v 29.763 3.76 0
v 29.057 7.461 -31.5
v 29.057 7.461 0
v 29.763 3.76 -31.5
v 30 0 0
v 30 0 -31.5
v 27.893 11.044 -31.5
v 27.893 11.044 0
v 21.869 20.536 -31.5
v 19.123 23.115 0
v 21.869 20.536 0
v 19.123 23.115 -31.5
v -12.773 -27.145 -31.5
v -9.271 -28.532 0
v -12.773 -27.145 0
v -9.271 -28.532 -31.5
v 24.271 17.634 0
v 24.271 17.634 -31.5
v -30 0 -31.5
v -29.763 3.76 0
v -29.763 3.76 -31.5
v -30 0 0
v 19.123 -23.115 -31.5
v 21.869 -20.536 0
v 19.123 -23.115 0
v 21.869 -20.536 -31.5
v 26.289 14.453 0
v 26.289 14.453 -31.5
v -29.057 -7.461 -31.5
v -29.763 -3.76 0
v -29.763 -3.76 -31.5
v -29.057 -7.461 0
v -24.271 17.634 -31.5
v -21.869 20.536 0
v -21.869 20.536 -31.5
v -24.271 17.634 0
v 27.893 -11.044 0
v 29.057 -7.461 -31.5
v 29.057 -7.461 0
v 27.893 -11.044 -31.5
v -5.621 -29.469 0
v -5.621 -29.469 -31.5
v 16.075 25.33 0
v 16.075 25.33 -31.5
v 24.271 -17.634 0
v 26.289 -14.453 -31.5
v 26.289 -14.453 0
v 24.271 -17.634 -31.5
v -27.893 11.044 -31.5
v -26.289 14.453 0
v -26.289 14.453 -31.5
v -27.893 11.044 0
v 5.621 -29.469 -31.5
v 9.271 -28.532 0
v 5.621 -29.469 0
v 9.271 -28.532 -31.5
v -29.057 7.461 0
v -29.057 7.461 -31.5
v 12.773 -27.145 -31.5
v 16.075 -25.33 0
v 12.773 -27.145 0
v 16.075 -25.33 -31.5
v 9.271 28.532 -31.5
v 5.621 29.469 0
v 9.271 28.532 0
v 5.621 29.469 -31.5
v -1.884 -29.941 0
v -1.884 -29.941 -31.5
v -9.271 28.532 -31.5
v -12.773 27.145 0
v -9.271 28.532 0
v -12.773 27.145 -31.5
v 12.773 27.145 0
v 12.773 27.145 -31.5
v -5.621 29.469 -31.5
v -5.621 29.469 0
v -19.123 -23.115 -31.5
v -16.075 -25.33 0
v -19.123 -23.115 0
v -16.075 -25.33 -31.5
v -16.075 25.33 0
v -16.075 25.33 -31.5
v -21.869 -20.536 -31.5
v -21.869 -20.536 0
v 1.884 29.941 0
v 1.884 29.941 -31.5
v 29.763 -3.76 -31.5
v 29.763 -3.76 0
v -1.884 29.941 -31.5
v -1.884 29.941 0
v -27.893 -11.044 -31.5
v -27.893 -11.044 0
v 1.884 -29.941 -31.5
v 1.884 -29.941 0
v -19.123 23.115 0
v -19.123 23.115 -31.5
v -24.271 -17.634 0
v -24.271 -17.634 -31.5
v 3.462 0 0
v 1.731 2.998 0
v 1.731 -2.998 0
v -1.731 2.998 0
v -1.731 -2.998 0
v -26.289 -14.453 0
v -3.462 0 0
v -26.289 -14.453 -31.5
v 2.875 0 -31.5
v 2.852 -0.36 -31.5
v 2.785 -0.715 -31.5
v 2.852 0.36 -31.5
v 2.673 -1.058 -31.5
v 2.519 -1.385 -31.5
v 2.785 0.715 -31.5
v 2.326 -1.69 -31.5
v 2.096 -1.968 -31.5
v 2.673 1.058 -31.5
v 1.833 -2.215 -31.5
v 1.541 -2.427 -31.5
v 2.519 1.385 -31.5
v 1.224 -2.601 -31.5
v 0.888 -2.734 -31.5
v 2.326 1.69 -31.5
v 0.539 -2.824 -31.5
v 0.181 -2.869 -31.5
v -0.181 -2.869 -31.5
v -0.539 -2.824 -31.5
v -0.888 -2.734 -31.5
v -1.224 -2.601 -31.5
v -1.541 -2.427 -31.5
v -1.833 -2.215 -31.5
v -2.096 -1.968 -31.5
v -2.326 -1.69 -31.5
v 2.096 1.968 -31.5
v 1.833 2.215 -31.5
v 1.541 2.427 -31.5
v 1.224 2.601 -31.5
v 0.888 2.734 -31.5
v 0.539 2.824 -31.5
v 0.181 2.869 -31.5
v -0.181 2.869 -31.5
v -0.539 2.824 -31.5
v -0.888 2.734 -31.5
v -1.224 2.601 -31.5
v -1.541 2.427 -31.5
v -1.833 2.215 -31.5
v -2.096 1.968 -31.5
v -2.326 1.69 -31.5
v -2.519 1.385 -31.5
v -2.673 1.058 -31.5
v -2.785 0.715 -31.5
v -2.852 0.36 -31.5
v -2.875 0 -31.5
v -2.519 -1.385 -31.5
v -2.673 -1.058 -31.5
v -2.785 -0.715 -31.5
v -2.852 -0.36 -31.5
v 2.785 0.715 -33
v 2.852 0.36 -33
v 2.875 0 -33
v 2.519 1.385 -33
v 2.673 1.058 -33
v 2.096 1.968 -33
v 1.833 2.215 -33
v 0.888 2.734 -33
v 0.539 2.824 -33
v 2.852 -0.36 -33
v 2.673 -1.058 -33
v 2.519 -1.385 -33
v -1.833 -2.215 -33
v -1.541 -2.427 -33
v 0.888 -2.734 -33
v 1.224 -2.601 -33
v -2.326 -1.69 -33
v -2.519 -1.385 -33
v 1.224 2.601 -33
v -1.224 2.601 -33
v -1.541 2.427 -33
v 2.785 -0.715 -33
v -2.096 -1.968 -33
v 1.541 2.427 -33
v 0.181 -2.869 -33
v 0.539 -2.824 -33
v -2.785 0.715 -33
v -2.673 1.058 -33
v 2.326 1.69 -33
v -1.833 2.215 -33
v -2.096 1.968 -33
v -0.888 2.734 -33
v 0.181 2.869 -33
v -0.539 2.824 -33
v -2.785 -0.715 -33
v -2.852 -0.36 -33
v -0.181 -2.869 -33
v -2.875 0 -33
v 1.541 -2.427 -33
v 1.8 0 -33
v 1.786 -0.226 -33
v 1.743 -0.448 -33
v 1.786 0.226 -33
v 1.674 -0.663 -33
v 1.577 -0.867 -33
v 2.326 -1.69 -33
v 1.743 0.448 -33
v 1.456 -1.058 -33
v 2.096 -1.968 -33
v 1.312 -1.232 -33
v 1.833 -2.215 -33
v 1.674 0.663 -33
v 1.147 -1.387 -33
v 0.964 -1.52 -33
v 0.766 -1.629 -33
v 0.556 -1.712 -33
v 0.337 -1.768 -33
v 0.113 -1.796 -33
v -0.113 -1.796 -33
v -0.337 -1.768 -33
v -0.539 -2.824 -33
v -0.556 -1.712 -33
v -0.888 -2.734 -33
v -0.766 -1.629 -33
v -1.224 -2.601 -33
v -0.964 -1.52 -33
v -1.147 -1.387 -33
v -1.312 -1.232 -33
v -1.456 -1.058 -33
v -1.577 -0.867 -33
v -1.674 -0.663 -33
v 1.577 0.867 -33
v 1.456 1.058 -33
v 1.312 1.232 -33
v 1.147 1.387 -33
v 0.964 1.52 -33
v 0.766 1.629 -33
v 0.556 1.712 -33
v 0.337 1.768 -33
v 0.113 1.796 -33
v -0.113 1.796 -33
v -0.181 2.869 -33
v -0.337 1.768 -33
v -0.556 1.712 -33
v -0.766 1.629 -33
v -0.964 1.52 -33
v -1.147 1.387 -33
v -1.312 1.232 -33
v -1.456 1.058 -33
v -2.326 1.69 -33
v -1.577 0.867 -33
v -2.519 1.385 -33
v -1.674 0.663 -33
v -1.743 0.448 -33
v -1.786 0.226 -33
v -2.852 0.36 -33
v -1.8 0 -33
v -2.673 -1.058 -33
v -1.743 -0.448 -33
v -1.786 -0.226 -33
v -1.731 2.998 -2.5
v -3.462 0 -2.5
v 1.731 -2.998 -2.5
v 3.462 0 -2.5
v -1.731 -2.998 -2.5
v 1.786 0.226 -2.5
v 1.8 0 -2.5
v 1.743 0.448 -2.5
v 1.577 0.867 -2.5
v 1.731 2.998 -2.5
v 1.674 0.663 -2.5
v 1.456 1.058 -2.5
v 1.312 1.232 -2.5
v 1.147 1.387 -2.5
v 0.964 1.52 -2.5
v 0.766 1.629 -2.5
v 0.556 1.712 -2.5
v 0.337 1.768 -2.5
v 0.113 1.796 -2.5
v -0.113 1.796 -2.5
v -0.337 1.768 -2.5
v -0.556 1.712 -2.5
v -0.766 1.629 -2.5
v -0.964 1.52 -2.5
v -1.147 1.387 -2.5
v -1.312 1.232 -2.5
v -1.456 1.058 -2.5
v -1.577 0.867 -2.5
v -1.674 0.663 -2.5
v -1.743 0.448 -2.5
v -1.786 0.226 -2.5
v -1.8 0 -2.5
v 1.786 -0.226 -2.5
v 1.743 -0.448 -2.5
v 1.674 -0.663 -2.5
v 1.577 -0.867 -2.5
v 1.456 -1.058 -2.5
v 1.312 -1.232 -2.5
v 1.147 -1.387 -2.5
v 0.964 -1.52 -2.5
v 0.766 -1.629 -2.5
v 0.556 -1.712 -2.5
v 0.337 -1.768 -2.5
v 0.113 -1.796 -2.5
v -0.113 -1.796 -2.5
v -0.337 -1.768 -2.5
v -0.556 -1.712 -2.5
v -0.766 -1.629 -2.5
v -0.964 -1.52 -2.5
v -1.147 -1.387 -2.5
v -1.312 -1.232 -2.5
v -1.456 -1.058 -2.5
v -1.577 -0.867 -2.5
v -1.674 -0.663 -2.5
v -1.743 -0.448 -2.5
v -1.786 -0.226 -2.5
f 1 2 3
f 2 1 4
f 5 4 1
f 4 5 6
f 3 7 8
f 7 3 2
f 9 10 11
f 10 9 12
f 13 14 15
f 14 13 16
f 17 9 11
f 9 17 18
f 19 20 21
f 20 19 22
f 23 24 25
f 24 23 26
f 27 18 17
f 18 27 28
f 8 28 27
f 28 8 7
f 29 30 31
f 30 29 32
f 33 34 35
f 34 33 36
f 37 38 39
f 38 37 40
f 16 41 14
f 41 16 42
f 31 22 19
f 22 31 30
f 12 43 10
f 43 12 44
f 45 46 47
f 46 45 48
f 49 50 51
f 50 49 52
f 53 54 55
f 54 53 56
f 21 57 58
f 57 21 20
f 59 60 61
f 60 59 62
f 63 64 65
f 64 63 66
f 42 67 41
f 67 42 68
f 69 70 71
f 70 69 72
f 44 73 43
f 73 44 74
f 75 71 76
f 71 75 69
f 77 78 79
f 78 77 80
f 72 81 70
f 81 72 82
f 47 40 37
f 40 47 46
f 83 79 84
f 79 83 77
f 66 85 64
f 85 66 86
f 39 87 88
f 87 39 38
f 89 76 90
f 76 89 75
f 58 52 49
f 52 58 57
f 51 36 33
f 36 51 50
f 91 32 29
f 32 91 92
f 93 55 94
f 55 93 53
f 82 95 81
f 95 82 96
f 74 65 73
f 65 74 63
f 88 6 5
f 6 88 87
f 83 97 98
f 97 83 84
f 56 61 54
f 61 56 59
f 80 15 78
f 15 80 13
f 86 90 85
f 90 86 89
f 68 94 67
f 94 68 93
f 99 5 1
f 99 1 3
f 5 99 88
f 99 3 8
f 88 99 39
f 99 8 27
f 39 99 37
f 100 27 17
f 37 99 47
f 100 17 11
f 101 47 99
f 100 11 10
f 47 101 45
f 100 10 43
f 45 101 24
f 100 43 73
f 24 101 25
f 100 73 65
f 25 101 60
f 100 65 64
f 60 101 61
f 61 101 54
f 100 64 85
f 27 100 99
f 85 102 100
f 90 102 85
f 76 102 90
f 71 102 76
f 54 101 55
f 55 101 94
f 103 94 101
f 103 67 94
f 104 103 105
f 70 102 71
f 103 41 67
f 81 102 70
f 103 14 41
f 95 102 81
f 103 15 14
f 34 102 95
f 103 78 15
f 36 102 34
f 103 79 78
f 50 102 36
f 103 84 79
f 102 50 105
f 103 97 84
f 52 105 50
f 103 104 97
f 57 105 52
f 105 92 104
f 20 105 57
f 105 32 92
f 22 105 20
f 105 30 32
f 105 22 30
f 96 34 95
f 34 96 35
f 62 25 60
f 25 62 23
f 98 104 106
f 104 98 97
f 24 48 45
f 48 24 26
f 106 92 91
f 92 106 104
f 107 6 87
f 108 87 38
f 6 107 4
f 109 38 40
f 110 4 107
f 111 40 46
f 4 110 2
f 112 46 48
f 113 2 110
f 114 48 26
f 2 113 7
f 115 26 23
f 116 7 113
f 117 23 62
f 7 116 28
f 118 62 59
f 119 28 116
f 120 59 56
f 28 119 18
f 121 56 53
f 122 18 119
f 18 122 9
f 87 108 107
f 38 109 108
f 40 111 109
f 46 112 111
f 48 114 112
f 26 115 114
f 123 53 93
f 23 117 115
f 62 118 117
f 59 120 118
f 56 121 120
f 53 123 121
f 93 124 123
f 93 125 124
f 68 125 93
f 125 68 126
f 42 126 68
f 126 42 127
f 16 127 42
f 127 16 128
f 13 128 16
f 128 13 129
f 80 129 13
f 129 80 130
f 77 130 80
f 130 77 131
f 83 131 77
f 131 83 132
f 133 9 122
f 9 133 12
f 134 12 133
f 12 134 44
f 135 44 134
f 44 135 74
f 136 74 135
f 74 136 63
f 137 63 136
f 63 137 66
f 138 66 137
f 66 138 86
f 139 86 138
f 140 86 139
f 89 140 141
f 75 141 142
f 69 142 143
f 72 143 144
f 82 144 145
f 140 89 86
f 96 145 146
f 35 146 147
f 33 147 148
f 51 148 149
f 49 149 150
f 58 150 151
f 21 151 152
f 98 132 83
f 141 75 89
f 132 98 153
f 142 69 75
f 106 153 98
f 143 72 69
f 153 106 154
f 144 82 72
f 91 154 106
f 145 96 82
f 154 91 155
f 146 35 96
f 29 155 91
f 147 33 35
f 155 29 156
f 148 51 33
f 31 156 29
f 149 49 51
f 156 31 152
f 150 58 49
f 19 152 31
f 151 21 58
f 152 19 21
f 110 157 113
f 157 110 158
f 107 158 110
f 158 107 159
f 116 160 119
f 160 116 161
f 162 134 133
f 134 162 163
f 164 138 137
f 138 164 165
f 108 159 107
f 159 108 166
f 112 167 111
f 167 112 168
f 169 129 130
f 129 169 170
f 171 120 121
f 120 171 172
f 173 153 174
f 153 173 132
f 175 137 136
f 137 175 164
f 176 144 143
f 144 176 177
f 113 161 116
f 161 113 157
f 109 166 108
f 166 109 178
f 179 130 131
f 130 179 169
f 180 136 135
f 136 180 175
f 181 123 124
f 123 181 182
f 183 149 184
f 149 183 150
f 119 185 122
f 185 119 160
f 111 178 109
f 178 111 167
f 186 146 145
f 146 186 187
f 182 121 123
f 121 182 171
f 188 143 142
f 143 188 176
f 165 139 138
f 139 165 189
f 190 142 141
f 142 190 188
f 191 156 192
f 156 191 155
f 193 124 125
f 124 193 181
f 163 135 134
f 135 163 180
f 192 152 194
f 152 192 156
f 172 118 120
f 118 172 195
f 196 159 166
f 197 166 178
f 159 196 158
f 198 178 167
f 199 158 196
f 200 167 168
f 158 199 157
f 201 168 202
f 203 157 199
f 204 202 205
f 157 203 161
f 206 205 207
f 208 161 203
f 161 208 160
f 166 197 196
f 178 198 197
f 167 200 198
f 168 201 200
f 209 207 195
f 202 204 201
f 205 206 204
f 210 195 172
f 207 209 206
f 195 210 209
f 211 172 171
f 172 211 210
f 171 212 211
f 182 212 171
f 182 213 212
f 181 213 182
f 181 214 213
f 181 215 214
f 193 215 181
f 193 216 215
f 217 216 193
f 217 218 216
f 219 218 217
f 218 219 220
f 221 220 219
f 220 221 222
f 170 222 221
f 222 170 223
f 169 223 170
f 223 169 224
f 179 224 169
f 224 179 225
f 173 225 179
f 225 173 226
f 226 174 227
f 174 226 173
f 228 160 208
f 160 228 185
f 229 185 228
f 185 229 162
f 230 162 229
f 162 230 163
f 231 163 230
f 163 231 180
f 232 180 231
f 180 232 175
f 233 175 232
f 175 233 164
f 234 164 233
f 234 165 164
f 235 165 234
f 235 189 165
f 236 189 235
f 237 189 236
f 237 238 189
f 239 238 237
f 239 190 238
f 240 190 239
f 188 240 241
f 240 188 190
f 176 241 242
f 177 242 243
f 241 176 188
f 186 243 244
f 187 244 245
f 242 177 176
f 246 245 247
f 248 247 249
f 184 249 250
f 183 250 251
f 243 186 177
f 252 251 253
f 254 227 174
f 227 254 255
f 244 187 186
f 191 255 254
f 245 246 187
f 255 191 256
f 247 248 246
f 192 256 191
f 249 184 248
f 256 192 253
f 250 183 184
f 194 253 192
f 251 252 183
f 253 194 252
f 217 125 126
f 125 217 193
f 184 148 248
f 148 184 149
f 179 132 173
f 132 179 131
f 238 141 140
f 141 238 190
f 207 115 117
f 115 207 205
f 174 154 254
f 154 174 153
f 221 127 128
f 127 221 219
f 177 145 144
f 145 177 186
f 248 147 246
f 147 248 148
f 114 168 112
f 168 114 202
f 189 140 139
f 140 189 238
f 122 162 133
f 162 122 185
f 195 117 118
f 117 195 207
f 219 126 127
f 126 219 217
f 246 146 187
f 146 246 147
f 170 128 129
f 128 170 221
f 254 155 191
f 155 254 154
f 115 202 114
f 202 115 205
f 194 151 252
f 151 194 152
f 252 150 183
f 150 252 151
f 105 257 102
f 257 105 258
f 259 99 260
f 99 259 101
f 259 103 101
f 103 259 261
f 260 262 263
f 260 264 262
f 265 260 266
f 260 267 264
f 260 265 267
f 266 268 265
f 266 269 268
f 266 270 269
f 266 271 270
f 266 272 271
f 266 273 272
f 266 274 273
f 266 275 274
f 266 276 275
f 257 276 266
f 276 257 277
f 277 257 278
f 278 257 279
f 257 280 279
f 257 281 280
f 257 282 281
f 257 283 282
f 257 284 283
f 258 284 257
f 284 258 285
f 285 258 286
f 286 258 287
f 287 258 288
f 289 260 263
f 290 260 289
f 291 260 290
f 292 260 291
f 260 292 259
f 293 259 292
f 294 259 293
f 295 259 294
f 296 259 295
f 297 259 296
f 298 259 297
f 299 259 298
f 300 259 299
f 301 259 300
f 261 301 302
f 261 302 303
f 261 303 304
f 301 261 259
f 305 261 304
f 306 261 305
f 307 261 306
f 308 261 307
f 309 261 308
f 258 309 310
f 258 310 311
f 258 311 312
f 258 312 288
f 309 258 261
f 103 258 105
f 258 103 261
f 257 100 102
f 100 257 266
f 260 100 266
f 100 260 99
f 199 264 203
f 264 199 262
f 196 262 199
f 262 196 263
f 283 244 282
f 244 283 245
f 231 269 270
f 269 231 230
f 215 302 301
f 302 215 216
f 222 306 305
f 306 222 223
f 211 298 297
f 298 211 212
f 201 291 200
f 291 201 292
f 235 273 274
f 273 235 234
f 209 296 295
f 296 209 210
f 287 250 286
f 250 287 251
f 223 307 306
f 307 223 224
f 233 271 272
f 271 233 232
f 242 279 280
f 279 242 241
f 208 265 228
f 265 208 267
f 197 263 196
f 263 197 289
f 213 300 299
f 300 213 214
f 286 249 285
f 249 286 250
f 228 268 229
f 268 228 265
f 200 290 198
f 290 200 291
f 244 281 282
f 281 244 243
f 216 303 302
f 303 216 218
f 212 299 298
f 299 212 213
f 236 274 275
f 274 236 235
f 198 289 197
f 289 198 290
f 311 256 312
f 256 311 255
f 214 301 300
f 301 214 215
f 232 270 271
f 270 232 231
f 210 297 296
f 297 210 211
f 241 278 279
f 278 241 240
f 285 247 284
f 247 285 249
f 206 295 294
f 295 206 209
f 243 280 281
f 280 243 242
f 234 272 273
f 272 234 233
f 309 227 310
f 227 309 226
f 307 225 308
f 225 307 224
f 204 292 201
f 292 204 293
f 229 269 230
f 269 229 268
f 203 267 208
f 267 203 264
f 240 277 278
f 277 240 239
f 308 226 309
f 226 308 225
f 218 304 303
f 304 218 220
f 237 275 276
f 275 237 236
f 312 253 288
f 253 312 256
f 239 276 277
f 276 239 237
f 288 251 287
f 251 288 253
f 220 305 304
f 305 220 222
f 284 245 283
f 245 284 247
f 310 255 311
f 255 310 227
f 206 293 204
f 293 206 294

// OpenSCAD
$fn = 50;

difference() {
	union() {
		translate(v = [0, 0, -31.5]) {
			cylinder(h = 31.5, r = 30.0);
		}
		#translate(v = [0, 0, -33.0]) {
			cylinder(h = 33, r = 2.875);
		}
	}
	union() {
		translate(v = [0, 0, 0]) {
			rotate(a = [0, 0, 0]) {
				difference() {
					union() {
						translate(v = [0, 0, -2.5]) {
							linear_extrude(height = 2.5) {
								polygon(points = [[3.4619999999999997, 0.0], [1.7310000000000003, 2.9981799479017264], [-1.7309999999999992, 2.9981799479017264], [-3.4619999999999997, 4.2397272186481365e-16], [-1.7310000000000014, -2.998179947901726], [1.7309999999999977, -2.9981799479017277]]);
							}
						}
					}
					union();
				}
			}
		}
		#translate(v = [0, 0, -100.0]) {
			cylinder(h = 200, r = 1.8);
		}
	}
}
